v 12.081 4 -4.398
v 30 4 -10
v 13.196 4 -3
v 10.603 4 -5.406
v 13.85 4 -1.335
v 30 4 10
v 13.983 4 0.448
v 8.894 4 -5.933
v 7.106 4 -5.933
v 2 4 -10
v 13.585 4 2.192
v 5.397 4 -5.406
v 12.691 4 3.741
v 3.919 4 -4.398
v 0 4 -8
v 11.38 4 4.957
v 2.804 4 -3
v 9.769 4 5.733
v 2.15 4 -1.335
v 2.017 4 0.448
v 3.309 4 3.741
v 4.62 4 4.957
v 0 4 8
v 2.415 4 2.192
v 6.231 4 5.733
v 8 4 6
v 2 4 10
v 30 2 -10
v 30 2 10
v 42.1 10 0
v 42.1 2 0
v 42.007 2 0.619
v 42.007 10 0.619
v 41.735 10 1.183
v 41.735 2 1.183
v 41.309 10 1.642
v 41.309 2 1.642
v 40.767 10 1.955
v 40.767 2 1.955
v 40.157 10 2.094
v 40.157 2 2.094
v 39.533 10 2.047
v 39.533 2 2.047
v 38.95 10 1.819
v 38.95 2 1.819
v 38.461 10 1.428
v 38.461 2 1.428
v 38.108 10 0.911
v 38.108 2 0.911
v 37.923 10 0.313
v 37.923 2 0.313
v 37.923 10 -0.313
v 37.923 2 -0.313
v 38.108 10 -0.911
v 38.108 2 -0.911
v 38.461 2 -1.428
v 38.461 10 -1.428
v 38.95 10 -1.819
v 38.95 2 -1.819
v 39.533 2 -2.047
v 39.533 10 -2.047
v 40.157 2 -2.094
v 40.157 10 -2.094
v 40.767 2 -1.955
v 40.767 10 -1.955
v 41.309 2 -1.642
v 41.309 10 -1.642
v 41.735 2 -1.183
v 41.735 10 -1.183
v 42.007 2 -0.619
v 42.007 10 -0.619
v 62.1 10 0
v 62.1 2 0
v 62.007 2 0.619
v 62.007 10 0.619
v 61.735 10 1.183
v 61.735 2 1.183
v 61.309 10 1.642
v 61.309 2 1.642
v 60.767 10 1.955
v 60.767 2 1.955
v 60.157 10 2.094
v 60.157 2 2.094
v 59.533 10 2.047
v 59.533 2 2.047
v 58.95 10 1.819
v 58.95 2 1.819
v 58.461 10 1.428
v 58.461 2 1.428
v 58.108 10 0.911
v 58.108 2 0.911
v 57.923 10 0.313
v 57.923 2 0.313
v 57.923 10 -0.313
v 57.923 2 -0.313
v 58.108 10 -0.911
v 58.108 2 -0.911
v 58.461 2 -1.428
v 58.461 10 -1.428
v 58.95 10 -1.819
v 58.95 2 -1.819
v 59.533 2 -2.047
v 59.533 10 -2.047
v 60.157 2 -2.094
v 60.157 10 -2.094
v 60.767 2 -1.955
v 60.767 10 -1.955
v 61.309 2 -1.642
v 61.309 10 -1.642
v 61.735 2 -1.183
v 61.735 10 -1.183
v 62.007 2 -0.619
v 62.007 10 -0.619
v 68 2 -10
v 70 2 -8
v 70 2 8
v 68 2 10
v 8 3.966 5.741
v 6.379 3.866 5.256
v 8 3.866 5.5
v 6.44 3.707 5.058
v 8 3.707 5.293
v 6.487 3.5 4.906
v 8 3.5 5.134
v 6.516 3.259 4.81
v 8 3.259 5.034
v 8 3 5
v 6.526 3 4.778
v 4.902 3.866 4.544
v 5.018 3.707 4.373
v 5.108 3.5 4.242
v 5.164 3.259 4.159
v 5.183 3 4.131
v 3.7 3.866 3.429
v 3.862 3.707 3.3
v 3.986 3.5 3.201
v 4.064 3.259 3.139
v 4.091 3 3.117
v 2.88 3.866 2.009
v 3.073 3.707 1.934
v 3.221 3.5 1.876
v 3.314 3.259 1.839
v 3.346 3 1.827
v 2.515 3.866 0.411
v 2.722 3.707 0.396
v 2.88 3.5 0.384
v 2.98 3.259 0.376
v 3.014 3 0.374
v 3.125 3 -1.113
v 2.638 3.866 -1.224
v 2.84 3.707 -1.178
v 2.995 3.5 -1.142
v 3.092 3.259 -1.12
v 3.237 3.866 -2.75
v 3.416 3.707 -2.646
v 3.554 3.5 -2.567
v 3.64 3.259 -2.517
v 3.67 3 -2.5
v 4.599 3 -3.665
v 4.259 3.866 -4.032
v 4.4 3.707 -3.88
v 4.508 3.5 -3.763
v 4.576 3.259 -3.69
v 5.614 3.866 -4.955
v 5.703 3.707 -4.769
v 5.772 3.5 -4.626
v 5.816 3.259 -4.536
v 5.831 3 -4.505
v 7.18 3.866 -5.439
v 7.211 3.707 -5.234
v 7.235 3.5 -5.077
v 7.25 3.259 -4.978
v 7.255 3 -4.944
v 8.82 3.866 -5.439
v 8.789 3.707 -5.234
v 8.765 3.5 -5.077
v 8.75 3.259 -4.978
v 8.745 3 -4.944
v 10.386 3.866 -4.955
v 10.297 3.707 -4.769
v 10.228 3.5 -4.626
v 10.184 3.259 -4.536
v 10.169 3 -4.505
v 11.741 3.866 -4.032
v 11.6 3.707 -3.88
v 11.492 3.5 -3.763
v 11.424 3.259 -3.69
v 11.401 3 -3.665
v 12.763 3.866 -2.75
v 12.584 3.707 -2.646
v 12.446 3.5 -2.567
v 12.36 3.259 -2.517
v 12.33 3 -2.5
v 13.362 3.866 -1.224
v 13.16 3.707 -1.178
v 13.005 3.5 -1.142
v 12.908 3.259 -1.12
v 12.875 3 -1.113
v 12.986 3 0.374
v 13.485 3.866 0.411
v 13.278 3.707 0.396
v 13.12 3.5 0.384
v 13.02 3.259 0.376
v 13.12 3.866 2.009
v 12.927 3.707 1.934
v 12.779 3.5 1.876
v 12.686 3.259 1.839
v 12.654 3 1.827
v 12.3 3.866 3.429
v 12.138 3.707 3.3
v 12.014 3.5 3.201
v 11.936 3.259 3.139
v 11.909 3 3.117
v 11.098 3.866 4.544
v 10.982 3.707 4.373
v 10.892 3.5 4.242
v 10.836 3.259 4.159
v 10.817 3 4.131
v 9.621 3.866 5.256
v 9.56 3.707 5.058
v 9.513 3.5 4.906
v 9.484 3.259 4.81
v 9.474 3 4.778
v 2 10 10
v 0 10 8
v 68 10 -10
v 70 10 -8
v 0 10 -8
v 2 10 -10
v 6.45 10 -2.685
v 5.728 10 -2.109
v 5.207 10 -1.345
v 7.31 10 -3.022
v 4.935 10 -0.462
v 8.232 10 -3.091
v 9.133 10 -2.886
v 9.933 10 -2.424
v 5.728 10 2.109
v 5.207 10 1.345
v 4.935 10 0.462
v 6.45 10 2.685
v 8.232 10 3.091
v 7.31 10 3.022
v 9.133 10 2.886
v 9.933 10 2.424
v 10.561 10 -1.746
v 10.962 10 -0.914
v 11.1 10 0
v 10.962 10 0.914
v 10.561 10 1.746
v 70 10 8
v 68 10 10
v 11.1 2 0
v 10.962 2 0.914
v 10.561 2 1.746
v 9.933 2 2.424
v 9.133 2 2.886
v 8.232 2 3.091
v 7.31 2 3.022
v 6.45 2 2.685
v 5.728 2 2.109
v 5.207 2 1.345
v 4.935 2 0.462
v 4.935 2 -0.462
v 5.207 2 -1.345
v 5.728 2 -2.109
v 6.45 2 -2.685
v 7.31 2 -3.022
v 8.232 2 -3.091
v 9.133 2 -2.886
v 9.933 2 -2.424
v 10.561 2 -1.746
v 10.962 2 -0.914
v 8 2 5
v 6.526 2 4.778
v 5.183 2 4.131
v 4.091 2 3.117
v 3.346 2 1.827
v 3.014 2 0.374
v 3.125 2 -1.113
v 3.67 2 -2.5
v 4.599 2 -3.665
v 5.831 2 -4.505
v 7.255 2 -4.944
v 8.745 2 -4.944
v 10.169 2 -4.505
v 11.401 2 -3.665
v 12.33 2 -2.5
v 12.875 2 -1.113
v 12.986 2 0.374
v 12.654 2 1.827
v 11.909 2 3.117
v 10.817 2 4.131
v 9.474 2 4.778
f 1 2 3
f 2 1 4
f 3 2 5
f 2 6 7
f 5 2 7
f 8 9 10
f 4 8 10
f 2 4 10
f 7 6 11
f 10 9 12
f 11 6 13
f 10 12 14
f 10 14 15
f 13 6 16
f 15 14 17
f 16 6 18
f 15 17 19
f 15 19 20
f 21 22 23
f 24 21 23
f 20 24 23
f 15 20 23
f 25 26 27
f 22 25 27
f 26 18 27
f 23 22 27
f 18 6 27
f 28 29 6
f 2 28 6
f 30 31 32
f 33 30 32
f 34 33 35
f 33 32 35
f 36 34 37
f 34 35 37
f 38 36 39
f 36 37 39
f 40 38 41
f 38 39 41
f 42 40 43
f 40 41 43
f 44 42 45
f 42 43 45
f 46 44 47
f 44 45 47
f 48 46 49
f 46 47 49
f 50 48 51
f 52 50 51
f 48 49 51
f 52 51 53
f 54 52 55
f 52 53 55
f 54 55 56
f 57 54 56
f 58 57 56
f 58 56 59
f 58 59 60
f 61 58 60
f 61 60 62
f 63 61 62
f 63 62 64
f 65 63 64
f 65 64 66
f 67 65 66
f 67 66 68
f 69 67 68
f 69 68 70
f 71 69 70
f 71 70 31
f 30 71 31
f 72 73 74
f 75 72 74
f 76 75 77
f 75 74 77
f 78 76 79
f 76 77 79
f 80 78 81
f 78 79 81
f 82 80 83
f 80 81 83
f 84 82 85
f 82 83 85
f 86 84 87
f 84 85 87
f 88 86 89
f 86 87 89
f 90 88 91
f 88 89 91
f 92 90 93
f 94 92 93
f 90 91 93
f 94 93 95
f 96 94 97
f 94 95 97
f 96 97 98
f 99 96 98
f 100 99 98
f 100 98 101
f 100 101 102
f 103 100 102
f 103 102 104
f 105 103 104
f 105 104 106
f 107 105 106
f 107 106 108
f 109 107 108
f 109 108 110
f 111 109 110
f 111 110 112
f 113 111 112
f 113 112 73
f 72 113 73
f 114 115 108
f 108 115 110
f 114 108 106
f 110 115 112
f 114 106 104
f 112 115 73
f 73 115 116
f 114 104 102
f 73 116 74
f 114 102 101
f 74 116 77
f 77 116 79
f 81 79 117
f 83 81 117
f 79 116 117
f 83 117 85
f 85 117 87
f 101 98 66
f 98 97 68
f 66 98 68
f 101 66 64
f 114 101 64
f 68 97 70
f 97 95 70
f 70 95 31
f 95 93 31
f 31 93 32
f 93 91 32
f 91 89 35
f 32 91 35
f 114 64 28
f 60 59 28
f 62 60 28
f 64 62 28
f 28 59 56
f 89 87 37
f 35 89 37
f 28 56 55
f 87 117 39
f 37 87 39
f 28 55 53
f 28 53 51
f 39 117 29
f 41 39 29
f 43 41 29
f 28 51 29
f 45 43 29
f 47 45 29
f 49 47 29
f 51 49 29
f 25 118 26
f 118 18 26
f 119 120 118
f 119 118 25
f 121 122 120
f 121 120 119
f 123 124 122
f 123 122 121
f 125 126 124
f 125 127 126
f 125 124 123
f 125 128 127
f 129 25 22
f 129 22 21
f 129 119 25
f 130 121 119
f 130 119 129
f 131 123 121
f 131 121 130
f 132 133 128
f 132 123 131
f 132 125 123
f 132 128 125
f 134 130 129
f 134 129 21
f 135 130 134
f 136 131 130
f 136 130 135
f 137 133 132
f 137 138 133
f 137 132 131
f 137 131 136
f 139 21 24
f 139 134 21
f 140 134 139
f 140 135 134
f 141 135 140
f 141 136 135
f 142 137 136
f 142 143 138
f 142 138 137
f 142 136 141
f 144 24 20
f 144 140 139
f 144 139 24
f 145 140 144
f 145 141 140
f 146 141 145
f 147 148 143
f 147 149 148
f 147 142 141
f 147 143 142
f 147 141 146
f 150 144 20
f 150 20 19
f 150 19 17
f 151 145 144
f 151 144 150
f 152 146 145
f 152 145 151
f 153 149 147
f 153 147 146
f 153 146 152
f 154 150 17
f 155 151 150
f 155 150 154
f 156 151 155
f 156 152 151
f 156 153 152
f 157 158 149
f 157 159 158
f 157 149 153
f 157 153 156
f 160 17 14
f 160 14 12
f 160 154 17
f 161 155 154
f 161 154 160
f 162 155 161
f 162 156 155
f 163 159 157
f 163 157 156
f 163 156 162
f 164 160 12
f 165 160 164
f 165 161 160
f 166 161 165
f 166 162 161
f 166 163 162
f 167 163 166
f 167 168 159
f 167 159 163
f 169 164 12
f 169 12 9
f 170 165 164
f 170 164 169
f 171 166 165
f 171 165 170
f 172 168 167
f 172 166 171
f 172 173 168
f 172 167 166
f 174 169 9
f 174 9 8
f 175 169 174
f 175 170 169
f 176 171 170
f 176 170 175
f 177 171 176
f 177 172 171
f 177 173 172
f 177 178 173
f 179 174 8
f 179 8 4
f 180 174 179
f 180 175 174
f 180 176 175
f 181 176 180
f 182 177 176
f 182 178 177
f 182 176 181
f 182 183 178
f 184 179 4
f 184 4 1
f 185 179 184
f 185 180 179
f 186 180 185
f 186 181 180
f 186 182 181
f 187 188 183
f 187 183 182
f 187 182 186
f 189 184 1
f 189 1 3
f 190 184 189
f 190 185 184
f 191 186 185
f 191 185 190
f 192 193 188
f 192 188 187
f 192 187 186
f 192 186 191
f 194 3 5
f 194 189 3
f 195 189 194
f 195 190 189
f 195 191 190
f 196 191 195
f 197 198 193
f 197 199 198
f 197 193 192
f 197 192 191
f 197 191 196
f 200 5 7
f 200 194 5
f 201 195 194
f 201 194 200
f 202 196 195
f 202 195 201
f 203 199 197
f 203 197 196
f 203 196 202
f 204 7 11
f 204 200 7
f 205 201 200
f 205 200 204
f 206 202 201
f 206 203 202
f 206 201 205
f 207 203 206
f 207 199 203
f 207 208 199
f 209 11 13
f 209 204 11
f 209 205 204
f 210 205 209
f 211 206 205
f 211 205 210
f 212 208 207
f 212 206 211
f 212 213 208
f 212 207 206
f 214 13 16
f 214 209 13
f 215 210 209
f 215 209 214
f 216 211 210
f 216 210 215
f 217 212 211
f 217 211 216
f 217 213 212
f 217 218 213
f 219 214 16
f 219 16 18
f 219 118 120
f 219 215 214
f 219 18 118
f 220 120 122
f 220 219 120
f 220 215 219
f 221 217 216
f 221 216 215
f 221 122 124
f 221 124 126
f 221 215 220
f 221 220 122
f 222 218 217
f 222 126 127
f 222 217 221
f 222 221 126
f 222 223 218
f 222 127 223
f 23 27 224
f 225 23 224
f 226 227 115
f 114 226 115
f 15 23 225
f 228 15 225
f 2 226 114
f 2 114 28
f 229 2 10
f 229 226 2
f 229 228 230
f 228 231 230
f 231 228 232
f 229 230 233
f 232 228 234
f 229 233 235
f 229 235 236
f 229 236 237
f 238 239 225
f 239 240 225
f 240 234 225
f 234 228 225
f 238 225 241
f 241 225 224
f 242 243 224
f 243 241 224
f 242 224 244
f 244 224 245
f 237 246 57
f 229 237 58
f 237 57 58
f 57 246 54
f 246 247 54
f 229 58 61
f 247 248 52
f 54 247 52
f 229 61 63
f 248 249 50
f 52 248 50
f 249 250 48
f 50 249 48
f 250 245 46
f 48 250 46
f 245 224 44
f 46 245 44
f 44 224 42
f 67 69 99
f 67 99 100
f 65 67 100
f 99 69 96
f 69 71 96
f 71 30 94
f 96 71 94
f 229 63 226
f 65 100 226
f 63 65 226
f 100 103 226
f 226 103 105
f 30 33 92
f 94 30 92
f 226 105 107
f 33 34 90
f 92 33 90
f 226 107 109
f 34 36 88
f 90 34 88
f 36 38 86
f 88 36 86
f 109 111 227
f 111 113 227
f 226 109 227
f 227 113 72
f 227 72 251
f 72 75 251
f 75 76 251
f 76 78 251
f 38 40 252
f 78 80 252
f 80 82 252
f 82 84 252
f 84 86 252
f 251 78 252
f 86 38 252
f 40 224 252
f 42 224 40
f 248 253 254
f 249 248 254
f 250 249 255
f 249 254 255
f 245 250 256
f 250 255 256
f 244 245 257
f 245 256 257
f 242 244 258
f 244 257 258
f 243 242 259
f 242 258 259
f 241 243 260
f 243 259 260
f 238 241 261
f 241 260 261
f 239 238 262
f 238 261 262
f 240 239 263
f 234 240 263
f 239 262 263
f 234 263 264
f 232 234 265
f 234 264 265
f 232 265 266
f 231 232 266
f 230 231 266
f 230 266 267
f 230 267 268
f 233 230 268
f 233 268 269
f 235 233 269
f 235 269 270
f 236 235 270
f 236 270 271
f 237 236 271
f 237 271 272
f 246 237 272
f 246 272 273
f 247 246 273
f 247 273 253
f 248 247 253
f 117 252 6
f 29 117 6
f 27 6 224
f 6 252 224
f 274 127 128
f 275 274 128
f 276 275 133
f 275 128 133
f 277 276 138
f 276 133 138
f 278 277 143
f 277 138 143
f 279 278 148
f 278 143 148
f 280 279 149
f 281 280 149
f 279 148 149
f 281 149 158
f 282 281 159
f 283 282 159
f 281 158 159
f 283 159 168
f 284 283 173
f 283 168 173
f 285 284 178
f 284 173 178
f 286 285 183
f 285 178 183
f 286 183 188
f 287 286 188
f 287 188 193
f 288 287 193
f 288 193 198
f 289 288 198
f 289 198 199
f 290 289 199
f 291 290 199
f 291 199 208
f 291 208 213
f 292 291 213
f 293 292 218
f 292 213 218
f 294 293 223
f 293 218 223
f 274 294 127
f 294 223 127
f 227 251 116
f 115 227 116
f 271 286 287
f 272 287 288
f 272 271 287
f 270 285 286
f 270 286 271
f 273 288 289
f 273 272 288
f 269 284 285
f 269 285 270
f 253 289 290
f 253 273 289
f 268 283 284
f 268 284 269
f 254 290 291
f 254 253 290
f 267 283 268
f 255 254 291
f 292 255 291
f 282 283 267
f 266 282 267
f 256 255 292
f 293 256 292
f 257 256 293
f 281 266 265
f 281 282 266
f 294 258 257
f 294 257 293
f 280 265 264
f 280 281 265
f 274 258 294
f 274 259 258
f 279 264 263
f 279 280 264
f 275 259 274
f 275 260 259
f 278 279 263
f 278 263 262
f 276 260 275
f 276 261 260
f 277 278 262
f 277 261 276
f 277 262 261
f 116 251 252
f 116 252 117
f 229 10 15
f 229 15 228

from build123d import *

# Parameters (mm, degrees)
EXTRUDE_1_DEPTH     = 10
SKETCH_3_R          = 5
EXTRUDE_2_DEPTH     = 2
CHAMFER_1_SIZE      = 2
CHAMFER_2_SIZE      = 2
SKETCH_4_R          = 2.1
SKETCH_4_R_2        = 3.1
CUT_EXTRUDE_1_DEPTH = 72.161787499
FILLET_1_R          = 1


with BuildPart() as part:
    # 草图1 → 凸台-拉伸1 (new, symmetric)
    with BuildSketch(Plane.XY):
        Polygon((0, 4), (0, 10), (70, 10), (70, 2), (30, 2), (30, 4), align=None)
    extrude(amount=EXTRUDE_1_DEPTH, both=True)

    # 草图3 → 凸台-拉伸2 (add)
    with BuildSketch(Plane.XZ.offset(-4)):
        with Locations(Location((8, 0, 0), (0, 0, 90))):
            Circle(SKETCH_3_R)
    extrude(amount=EXTRUDE_2_DEPTH)

    # 倒角1
    chamfer_1_edges = [part.edges().sort_by_distance(p)[0] for p in [
        (0, 7, -10),
        (0, 7, 10),
    ]]
    chamfer(chamfer_1_edges, length=CHAMFER_1_SIZE)

    # 倒角2
    chamfer_2_edges = [part.edges().sort_by_distance(p)[0] for p in [
        (70, 6, 10),
        (70, 6, -10),
    ]]
    chamfer(chamfer_2_edges, length=CHAMFER_2_SIZE)

    # 草图4 → 切除-拉伸1 (cut, through all)
    with BuildSketch(Plane.XZ.offset(-2)):
        with Locations((40, 0)):
            Circle(SKETCH_4_R)
        with Locations((60, 0)):
            Circle(SKETCH_4_R)
        with Locations((8, 0)):
            Circle(SKETCH_4_R_2)
    extrude(amount=-CUT_EXTRUDE_1_DEPTH, mode=Mode.SUBTRACT)

    # 圆角1
    fillet_1_edges = [part.edges().sort_by_distance(p)[0] for p in [
        (8, 4, -5),
    ]]
    fillet(fillet_1_edges, radius=FILLET_1_R)


solid = part.part
